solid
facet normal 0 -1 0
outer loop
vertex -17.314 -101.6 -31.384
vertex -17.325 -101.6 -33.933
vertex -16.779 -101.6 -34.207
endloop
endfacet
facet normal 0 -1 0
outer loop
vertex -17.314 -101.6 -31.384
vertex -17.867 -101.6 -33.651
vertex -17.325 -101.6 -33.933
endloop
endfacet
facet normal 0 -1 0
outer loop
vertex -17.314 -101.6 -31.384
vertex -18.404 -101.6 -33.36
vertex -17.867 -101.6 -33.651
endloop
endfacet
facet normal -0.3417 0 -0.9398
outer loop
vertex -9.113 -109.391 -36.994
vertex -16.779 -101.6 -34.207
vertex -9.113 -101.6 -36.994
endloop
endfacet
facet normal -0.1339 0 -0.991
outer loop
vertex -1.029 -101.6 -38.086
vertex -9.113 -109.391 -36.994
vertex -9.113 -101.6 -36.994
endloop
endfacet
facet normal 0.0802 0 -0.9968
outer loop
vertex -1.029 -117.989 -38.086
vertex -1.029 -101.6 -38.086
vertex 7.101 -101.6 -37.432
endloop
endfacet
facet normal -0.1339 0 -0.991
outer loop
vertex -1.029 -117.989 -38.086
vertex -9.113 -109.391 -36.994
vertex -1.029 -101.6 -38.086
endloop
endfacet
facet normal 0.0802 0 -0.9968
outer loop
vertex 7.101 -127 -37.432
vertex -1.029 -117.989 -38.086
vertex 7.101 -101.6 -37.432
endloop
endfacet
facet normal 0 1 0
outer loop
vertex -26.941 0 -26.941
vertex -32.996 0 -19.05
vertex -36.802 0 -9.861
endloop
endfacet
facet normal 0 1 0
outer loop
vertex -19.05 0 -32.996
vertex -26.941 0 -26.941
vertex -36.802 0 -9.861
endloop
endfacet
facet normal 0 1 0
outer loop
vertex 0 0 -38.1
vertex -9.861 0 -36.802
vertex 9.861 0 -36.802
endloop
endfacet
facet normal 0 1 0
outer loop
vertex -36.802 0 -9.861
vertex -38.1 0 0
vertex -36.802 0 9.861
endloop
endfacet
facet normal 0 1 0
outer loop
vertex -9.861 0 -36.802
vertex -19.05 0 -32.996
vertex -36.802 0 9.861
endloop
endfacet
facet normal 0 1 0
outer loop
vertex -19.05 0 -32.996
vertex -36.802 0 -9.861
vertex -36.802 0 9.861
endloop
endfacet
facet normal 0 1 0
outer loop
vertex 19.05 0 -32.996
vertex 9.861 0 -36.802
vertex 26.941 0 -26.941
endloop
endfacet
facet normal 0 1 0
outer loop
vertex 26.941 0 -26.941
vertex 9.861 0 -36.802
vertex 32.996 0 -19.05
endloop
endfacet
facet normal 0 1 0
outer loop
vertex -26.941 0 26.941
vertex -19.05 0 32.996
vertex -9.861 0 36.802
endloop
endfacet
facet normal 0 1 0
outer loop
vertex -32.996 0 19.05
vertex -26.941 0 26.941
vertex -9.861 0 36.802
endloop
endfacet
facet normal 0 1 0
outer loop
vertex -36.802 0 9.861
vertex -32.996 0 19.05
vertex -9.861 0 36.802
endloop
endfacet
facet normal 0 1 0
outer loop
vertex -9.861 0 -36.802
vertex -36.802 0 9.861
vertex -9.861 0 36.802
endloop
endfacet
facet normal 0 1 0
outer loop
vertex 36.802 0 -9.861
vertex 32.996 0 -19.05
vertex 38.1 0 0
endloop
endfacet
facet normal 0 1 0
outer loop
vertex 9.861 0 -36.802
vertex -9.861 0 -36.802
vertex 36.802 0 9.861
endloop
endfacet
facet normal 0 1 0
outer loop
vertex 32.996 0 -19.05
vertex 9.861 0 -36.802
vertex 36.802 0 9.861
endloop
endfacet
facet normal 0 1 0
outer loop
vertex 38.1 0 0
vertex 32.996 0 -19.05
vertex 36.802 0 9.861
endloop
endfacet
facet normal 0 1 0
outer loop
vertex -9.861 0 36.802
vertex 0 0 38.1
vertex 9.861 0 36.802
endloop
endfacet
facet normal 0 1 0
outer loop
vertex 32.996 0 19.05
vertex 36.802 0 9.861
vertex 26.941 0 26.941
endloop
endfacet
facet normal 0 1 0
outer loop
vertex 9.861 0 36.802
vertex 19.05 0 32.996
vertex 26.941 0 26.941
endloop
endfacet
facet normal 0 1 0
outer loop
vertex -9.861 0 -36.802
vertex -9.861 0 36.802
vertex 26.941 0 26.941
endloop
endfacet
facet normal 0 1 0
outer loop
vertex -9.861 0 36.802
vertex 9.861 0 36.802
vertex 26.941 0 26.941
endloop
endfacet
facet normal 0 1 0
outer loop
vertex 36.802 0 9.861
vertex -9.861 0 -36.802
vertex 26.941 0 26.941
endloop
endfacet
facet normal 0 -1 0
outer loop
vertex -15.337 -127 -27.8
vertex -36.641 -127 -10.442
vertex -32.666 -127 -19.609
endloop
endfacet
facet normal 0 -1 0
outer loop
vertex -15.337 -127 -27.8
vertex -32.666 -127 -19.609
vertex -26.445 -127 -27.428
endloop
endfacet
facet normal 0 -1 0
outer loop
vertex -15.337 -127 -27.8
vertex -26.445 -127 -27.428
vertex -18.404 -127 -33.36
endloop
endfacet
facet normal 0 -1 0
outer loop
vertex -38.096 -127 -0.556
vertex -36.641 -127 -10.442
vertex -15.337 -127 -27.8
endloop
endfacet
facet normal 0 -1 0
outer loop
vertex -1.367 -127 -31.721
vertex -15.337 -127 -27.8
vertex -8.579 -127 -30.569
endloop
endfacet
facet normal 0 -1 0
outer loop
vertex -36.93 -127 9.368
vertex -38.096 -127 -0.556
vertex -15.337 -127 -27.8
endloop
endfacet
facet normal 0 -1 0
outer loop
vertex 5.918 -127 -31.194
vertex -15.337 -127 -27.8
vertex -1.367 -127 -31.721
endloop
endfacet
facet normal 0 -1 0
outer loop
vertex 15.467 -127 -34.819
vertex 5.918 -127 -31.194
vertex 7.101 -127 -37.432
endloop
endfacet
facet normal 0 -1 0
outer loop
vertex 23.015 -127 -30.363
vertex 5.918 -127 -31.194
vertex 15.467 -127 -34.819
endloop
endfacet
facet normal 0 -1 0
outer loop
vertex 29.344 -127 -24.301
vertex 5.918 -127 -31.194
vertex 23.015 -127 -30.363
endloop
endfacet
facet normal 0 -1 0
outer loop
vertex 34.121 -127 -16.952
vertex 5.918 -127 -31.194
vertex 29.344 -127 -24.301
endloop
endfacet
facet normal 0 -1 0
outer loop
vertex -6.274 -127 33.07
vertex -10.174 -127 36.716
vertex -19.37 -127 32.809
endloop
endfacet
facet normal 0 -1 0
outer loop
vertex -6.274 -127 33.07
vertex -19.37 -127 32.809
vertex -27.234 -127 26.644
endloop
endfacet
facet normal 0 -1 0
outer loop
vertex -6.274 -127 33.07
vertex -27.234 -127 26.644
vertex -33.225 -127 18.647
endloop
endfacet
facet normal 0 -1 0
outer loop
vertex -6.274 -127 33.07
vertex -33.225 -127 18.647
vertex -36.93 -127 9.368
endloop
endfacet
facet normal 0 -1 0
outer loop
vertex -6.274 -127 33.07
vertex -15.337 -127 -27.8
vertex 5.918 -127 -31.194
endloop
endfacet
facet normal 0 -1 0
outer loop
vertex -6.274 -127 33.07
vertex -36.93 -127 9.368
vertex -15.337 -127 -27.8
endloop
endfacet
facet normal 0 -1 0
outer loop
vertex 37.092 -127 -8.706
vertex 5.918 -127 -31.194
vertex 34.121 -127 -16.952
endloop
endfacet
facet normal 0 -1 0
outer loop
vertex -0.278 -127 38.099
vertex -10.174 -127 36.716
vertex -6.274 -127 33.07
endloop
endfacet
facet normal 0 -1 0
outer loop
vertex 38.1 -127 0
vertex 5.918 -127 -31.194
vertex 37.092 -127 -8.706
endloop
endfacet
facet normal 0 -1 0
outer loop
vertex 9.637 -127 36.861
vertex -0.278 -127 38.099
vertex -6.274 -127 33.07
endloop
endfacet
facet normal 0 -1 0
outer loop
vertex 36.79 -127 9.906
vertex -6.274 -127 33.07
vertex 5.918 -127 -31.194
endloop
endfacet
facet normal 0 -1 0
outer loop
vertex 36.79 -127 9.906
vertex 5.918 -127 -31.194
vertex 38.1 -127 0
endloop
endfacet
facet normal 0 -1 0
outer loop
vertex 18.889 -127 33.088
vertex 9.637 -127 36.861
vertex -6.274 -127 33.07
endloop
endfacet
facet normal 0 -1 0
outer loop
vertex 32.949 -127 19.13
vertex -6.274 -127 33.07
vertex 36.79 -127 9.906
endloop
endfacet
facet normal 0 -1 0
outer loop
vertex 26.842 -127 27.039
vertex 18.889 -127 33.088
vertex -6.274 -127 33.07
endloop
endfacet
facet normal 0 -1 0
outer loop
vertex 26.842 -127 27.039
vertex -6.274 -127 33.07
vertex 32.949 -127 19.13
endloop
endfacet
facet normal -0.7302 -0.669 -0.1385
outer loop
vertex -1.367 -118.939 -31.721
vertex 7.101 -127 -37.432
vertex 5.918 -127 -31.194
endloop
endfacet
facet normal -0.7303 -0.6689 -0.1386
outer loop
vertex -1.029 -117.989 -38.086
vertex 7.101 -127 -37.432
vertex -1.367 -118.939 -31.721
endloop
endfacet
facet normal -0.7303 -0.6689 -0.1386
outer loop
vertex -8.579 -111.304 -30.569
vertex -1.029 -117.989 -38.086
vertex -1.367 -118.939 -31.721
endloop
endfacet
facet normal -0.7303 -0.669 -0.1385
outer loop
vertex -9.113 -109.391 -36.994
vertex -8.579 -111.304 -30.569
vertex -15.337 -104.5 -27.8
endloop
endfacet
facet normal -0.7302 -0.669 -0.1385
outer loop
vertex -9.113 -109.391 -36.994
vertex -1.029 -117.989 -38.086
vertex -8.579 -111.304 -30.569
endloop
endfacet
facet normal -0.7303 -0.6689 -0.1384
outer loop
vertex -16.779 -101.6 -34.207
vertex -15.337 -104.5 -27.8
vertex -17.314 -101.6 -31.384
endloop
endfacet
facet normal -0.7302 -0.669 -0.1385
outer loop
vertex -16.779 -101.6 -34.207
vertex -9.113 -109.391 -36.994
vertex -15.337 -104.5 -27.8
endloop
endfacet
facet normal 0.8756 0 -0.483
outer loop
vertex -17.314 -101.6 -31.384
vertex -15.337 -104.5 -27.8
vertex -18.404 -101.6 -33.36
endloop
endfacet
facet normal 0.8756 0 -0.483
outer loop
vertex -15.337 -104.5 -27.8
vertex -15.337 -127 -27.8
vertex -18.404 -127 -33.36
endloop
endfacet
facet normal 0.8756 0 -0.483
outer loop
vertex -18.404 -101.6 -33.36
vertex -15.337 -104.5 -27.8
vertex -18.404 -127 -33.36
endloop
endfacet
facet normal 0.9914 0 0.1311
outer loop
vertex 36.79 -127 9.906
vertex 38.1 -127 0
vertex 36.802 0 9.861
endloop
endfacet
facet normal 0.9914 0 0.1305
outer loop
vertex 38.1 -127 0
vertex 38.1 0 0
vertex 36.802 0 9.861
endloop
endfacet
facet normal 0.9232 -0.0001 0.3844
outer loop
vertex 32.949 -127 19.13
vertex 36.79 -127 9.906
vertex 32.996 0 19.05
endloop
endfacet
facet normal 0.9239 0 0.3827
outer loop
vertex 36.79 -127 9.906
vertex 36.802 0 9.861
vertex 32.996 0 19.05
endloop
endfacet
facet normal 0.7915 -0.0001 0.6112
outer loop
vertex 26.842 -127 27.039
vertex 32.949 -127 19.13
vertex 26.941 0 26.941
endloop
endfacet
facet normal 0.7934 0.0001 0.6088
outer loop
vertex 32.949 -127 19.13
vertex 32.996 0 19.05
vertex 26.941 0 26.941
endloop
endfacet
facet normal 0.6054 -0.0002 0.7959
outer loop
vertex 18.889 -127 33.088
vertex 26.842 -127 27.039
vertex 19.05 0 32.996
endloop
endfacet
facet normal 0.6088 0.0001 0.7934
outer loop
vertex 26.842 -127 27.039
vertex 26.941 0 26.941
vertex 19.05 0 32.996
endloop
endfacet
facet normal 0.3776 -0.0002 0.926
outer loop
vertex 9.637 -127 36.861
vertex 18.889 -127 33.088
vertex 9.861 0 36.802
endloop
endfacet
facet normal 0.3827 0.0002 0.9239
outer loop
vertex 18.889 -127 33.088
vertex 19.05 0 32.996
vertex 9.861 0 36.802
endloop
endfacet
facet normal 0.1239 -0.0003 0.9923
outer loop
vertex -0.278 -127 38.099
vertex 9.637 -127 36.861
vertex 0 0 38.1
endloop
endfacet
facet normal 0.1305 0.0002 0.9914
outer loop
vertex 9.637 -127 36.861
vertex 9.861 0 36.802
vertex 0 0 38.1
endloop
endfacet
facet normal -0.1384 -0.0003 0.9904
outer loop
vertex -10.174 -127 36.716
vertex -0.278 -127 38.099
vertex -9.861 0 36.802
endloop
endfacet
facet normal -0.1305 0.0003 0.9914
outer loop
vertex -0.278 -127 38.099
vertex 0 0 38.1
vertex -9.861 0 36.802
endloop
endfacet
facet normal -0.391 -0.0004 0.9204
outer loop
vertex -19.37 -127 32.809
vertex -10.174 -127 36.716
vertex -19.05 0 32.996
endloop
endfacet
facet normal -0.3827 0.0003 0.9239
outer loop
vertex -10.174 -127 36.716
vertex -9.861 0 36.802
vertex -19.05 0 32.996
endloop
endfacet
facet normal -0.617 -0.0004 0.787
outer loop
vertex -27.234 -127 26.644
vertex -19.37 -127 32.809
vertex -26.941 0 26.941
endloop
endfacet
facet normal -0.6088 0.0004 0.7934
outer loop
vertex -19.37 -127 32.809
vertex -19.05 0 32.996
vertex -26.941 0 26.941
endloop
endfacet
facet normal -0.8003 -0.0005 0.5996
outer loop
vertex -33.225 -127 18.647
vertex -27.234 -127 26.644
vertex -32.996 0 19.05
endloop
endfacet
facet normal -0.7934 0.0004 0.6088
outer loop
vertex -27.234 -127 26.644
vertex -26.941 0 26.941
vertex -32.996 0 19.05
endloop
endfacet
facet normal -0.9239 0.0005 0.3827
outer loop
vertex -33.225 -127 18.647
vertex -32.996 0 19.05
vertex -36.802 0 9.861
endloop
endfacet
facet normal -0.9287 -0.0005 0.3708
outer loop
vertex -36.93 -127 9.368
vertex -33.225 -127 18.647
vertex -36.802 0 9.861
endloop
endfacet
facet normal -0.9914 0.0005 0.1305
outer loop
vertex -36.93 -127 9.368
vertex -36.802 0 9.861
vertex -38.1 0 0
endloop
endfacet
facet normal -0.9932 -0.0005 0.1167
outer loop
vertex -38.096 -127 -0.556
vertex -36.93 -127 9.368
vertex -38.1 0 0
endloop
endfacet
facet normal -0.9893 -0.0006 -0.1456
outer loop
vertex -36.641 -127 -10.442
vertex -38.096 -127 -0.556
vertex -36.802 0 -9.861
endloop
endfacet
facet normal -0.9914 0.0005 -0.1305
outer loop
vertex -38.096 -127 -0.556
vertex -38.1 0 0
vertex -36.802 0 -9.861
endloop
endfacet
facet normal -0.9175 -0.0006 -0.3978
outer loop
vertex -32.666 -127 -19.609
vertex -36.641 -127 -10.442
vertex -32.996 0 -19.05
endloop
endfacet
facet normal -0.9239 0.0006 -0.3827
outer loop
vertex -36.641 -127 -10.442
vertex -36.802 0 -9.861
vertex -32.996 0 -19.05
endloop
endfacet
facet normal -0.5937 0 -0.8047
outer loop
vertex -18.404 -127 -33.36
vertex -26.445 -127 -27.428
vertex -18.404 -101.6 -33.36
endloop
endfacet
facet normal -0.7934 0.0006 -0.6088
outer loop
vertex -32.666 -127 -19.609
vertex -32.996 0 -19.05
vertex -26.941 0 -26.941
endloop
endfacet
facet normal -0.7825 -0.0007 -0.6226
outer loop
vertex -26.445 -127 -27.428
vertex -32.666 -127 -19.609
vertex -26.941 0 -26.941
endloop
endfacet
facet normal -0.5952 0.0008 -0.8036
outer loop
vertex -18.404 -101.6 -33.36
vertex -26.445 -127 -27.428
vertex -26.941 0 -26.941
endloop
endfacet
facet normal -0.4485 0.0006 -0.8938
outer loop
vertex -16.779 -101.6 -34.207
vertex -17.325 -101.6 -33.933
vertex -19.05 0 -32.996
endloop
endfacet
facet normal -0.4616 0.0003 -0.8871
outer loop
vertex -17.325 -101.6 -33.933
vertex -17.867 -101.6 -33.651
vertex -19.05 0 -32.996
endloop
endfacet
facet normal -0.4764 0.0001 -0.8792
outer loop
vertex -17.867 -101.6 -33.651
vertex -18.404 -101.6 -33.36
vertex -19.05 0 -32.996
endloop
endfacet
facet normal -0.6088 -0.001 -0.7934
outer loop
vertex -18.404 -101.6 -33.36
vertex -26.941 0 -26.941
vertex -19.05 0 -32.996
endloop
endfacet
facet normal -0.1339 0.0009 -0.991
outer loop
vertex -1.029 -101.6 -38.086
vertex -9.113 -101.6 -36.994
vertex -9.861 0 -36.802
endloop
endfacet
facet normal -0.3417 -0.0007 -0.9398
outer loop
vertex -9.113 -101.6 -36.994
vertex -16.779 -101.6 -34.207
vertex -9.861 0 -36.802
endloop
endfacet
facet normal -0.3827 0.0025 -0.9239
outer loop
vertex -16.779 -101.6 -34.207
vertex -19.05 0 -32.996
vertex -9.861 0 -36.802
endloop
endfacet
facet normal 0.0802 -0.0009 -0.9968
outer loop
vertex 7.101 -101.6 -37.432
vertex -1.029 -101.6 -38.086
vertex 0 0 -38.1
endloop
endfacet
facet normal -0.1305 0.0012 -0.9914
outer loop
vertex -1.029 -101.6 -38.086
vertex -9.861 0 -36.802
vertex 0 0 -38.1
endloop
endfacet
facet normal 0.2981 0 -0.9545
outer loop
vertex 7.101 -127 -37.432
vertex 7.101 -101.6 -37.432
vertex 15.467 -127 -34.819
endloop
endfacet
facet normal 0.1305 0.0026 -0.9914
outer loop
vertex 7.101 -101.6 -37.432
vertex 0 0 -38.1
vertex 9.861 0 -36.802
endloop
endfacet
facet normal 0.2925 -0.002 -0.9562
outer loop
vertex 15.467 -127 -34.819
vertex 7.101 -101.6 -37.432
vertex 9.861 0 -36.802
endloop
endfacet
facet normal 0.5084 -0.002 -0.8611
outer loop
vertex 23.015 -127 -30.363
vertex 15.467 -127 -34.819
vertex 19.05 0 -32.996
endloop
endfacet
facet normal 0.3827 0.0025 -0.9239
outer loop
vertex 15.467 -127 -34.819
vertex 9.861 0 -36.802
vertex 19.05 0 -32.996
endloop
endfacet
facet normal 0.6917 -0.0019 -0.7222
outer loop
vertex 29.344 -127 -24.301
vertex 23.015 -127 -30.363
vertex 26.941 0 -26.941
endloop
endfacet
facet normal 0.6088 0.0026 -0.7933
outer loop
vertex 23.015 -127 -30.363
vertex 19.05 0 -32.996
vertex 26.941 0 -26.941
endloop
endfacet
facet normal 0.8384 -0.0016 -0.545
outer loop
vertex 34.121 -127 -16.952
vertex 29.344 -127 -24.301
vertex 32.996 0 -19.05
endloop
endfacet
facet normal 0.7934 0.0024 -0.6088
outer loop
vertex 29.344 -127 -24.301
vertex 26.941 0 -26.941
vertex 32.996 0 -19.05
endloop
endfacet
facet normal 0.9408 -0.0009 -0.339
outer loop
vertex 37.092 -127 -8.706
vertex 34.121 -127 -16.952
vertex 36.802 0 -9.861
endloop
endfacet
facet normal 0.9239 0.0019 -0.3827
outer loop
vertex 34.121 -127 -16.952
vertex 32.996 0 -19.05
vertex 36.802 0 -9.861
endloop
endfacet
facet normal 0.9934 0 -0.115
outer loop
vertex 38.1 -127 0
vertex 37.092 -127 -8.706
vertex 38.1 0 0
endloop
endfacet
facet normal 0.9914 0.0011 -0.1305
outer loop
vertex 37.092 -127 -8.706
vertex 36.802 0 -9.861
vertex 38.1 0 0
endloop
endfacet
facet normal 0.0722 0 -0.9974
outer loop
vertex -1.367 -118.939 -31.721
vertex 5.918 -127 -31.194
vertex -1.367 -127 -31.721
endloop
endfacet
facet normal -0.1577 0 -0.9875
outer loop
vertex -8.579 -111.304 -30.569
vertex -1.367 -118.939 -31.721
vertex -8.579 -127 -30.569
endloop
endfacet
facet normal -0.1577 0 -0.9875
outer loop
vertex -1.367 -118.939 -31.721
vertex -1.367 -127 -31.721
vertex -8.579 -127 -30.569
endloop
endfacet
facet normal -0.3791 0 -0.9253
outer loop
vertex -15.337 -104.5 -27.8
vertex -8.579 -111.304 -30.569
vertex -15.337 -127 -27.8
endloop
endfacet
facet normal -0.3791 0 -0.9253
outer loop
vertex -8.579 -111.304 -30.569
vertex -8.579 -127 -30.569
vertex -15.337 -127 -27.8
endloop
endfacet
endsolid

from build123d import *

# Parameters (mm, degrees)
F0_R        = 38.1
F1_DEPTH    = 127
F3_DEPTH    = 25.4
F4_T4_DEPTH = 137.1700814202
F4_S5_R     = 38.1
F4_T6_DEPTH = 76


# Not quite as in the source:
# - a fillet or chamfer that OpenCascade refuses, or shapes differently, is made with other operations: its cross-section is extruded or revolved along the edge and cut away or added


with BuildPart() as f1:
    # F0 (on Front) → F1 (new body)
    with BuildSketch(Plane.XZ):
        Circle(F0_R)
    extrude(amount=F1_DEPTH)

    # F2 (on face) → F3 (cut)
    with BuildSketch(Plane.XZ.offset(127)):
        with BuildLine():
            ThreePointArc((5.9175740903, -31.1936662944), (-5.0060402001, -31.3528636892), (-15.3369587331, -27.8000035399))
            Line((-15.3369587331, -27.8000035399), (-19.9380463531, -36.1400046019))
            ThreePointArc((-19.9380463531, -36.1400046019), (-6.5078522601, -40.758722796), (7.6928463174, -40.5517661827))
            Line((7.6928463174, -40.5517661827), (5.9175740903, -31.1936662944))
        make_face()
    extrude(amount=-F3_DEPTH, mode=Mode.SUBTRACT)

    # F4: chamfer of 25.4 x 22.86 on 1 edges, made by hand


with BuildPart() as f4_tool2:
    # F4_s3 → F4_t4 (new body)
    with BuildSketch(Plane(origin=(19.2922310235, 0, -101.6963045048), x_dir=(0, 1, 0), z_dir=(-0.1863802863, 0, 0.9824776786))):
        Polygon((-127, 0), (-101.6, 22.86), (-101.6, 0), align=None)
    extrude(amount=F4_T4_DEPTH)

    # F4_s5 → F4_t6 (intersect, symmetric)
    with BuildSketch(Plane.XZ.offset(114.3)):
        Circle(F4_S5_R)
    extrude(amount=F4_T6_DEPTH, both=True, mode=Mode.INTERSECT)

    split(bisect_by=Plane.XZ.offset(127), keep=Keep.BOTTOM)


with BuildPart() as f1_1:
    add(f1.part)

    # F4_t1: union F4_tool2
    add(f4_tool2.part)


solid = f1_1.part
